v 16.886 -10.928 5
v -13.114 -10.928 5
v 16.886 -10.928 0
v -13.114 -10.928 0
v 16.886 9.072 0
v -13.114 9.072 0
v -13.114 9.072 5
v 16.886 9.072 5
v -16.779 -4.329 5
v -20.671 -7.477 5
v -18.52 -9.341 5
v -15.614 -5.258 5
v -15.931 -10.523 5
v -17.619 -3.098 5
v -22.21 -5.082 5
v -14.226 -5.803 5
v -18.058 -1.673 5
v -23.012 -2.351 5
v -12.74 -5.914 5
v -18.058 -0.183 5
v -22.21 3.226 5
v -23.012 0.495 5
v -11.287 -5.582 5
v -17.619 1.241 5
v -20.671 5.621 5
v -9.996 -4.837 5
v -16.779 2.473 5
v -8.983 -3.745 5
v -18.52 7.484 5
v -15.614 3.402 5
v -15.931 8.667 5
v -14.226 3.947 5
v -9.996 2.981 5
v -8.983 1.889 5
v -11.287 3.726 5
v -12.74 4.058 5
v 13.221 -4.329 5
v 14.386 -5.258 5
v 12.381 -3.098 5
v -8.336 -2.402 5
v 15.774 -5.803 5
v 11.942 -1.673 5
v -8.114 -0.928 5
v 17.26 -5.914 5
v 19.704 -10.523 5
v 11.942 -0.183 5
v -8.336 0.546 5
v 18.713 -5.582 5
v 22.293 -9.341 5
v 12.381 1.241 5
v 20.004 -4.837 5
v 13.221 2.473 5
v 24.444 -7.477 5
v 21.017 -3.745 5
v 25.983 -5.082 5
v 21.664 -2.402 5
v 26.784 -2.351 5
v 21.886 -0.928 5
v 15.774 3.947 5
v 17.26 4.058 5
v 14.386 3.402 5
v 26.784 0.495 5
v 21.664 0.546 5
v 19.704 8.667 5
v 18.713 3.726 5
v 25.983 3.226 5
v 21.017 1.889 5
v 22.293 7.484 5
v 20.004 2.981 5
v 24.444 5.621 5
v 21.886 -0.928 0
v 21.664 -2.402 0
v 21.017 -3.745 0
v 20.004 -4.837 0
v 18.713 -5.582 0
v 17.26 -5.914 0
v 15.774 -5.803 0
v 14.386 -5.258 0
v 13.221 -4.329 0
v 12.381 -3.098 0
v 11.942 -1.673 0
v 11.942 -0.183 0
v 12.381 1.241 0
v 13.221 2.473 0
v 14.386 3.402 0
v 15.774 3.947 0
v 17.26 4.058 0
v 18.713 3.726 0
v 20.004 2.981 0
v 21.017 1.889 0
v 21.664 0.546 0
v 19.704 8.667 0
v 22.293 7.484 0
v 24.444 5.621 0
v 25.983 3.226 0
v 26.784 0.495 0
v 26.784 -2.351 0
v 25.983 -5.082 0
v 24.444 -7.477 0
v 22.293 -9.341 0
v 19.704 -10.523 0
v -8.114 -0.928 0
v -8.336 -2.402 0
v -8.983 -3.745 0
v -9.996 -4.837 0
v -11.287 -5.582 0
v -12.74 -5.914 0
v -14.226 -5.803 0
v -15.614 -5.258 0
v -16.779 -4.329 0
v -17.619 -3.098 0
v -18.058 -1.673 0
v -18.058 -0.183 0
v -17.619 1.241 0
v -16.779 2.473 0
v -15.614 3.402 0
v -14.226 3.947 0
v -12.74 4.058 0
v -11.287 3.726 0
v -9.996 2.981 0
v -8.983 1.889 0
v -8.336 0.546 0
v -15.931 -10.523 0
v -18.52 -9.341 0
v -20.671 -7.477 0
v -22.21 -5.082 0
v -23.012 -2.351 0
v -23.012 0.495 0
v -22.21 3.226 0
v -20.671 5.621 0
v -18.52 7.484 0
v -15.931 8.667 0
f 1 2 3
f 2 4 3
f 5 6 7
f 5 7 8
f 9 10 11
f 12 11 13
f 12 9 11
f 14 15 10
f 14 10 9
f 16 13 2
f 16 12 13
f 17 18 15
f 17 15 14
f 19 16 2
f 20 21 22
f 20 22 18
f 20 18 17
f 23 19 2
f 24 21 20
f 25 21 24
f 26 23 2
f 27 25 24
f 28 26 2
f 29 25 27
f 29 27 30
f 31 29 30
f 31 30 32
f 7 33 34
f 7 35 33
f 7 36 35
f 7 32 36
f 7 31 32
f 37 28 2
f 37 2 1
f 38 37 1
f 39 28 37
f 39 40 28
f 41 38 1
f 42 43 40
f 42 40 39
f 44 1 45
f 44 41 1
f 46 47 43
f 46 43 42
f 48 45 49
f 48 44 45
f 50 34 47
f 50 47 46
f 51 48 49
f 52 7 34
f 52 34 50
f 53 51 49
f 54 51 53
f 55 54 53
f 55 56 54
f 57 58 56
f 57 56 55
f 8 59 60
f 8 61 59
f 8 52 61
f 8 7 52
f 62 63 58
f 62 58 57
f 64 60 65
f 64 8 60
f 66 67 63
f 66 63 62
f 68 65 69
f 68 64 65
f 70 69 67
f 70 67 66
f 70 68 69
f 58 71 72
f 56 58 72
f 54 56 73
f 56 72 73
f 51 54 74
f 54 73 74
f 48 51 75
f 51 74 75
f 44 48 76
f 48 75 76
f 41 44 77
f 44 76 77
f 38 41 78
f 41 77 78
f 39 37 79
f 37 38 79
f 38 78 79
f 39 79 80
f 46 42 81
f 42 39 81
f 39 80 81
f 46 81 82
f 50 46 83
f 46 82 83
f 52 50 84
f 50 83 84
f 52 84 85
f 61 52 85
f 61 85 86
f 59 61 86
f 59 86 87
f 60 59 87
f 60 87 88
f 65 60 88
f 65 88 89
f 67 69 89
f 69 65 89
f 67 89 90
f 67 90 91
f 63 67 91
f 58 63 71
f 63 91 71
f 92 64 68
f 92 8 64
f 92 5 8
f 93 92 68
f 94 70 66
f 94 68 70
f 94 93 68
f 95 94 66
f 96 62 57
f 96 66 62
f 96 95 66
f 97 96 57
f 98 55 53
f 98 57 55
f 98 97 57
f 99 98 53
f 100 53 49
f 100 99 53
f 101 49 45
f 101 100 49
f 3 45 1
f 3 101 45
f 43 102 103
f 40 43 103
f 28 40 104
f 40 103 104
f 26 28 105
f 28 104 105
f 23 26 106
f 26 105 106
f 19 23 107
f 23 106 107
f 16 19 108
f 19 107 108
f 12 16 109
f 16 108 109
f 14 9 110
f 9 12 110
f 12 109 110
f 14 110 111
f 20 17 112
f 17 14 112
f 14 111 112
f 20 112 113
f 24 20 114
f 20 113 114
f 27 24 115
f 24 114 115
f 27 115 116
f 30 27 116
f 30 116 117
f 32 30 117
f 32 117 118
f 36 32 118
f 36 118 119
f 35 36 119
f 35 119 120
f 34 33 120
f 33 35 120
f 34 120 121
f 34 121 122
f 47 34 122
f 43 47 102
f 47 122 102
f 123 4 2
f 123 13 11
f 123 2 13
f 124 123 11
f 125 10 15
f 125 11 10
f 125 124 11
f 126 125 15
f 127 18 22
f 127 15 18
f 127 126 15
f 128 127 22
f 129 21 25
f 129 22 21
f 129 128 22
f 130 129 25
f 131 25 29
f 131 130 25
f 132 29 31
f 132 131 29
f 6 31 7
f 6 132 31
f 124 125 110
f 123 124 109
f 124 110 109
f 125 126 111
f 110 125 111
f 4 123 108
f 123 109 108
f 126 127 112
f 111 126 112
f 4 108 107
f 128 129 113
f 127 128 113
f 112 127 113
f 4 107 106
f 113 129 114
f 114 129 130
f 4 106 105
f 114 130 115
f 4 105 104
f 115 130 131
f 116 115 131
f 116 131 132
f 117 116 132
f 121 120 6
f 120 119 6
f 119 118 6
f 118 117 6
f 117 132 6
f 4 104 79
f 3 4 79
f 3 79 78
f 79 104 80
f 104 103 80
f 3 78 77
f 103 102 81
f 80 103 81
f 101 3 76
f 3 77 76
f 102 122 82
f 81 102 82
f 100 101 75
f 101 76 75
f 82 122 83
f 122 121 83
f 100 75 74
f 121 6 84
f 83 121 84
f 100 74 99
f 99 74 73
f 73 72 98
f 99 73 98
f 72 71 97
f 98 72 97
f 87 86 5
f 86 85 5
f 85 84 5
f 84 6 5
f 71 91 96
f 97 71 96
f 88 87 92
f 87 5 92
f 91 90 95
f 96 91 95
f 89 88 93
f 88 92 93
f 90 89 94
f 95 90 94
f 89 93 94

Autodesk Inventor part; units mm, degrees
ref_plane "YZ Plane" through (0, 0, 0) normal (1, 0, 0) x (0, 1, 0)
ref_plane "XZ Plane" through (0, 0, 0) normal (0, 1, 0) x (-1, 0, 0)
ref_plane "XY Plane" through (0, 0, 0) normal (0, 0, 1) x (1, 0, 0)
sketch "Sketch1" plane through (0, 0, 0) normal (0, 0, 1) x (1, 0, 0)
  arc A0 (-13.1138, 9.0719) -> (-13.1138, -10.9281) centre (-13.1138, -0.9281) ccw
  arc A1 (16.8862, -10.9281) -> (16.8862, 9.0719) centre (16.8862, -0.9281) ccw
  line L0 (-13.1138, 9.0719) -> (16.8862, 9.0719)
  line L1 (-13.1138, -10.9281) -> (16.8862, -10.9281)
  circle A2 centre (-13.1138, -0.9281) radius 5
  circle A3 centre (16.8862, -0.9281) radius 5
  point P0 (0, 0)
  dimension "d0" = 20
  dimension "d1" = 20
  dimension "d2" = 30
  dimension "d3" = 10
  dimension "d4" = 10
extrude "Extrusion1" add sketch "Sketch1" along normal blind 5
properties part number "lesson3"
